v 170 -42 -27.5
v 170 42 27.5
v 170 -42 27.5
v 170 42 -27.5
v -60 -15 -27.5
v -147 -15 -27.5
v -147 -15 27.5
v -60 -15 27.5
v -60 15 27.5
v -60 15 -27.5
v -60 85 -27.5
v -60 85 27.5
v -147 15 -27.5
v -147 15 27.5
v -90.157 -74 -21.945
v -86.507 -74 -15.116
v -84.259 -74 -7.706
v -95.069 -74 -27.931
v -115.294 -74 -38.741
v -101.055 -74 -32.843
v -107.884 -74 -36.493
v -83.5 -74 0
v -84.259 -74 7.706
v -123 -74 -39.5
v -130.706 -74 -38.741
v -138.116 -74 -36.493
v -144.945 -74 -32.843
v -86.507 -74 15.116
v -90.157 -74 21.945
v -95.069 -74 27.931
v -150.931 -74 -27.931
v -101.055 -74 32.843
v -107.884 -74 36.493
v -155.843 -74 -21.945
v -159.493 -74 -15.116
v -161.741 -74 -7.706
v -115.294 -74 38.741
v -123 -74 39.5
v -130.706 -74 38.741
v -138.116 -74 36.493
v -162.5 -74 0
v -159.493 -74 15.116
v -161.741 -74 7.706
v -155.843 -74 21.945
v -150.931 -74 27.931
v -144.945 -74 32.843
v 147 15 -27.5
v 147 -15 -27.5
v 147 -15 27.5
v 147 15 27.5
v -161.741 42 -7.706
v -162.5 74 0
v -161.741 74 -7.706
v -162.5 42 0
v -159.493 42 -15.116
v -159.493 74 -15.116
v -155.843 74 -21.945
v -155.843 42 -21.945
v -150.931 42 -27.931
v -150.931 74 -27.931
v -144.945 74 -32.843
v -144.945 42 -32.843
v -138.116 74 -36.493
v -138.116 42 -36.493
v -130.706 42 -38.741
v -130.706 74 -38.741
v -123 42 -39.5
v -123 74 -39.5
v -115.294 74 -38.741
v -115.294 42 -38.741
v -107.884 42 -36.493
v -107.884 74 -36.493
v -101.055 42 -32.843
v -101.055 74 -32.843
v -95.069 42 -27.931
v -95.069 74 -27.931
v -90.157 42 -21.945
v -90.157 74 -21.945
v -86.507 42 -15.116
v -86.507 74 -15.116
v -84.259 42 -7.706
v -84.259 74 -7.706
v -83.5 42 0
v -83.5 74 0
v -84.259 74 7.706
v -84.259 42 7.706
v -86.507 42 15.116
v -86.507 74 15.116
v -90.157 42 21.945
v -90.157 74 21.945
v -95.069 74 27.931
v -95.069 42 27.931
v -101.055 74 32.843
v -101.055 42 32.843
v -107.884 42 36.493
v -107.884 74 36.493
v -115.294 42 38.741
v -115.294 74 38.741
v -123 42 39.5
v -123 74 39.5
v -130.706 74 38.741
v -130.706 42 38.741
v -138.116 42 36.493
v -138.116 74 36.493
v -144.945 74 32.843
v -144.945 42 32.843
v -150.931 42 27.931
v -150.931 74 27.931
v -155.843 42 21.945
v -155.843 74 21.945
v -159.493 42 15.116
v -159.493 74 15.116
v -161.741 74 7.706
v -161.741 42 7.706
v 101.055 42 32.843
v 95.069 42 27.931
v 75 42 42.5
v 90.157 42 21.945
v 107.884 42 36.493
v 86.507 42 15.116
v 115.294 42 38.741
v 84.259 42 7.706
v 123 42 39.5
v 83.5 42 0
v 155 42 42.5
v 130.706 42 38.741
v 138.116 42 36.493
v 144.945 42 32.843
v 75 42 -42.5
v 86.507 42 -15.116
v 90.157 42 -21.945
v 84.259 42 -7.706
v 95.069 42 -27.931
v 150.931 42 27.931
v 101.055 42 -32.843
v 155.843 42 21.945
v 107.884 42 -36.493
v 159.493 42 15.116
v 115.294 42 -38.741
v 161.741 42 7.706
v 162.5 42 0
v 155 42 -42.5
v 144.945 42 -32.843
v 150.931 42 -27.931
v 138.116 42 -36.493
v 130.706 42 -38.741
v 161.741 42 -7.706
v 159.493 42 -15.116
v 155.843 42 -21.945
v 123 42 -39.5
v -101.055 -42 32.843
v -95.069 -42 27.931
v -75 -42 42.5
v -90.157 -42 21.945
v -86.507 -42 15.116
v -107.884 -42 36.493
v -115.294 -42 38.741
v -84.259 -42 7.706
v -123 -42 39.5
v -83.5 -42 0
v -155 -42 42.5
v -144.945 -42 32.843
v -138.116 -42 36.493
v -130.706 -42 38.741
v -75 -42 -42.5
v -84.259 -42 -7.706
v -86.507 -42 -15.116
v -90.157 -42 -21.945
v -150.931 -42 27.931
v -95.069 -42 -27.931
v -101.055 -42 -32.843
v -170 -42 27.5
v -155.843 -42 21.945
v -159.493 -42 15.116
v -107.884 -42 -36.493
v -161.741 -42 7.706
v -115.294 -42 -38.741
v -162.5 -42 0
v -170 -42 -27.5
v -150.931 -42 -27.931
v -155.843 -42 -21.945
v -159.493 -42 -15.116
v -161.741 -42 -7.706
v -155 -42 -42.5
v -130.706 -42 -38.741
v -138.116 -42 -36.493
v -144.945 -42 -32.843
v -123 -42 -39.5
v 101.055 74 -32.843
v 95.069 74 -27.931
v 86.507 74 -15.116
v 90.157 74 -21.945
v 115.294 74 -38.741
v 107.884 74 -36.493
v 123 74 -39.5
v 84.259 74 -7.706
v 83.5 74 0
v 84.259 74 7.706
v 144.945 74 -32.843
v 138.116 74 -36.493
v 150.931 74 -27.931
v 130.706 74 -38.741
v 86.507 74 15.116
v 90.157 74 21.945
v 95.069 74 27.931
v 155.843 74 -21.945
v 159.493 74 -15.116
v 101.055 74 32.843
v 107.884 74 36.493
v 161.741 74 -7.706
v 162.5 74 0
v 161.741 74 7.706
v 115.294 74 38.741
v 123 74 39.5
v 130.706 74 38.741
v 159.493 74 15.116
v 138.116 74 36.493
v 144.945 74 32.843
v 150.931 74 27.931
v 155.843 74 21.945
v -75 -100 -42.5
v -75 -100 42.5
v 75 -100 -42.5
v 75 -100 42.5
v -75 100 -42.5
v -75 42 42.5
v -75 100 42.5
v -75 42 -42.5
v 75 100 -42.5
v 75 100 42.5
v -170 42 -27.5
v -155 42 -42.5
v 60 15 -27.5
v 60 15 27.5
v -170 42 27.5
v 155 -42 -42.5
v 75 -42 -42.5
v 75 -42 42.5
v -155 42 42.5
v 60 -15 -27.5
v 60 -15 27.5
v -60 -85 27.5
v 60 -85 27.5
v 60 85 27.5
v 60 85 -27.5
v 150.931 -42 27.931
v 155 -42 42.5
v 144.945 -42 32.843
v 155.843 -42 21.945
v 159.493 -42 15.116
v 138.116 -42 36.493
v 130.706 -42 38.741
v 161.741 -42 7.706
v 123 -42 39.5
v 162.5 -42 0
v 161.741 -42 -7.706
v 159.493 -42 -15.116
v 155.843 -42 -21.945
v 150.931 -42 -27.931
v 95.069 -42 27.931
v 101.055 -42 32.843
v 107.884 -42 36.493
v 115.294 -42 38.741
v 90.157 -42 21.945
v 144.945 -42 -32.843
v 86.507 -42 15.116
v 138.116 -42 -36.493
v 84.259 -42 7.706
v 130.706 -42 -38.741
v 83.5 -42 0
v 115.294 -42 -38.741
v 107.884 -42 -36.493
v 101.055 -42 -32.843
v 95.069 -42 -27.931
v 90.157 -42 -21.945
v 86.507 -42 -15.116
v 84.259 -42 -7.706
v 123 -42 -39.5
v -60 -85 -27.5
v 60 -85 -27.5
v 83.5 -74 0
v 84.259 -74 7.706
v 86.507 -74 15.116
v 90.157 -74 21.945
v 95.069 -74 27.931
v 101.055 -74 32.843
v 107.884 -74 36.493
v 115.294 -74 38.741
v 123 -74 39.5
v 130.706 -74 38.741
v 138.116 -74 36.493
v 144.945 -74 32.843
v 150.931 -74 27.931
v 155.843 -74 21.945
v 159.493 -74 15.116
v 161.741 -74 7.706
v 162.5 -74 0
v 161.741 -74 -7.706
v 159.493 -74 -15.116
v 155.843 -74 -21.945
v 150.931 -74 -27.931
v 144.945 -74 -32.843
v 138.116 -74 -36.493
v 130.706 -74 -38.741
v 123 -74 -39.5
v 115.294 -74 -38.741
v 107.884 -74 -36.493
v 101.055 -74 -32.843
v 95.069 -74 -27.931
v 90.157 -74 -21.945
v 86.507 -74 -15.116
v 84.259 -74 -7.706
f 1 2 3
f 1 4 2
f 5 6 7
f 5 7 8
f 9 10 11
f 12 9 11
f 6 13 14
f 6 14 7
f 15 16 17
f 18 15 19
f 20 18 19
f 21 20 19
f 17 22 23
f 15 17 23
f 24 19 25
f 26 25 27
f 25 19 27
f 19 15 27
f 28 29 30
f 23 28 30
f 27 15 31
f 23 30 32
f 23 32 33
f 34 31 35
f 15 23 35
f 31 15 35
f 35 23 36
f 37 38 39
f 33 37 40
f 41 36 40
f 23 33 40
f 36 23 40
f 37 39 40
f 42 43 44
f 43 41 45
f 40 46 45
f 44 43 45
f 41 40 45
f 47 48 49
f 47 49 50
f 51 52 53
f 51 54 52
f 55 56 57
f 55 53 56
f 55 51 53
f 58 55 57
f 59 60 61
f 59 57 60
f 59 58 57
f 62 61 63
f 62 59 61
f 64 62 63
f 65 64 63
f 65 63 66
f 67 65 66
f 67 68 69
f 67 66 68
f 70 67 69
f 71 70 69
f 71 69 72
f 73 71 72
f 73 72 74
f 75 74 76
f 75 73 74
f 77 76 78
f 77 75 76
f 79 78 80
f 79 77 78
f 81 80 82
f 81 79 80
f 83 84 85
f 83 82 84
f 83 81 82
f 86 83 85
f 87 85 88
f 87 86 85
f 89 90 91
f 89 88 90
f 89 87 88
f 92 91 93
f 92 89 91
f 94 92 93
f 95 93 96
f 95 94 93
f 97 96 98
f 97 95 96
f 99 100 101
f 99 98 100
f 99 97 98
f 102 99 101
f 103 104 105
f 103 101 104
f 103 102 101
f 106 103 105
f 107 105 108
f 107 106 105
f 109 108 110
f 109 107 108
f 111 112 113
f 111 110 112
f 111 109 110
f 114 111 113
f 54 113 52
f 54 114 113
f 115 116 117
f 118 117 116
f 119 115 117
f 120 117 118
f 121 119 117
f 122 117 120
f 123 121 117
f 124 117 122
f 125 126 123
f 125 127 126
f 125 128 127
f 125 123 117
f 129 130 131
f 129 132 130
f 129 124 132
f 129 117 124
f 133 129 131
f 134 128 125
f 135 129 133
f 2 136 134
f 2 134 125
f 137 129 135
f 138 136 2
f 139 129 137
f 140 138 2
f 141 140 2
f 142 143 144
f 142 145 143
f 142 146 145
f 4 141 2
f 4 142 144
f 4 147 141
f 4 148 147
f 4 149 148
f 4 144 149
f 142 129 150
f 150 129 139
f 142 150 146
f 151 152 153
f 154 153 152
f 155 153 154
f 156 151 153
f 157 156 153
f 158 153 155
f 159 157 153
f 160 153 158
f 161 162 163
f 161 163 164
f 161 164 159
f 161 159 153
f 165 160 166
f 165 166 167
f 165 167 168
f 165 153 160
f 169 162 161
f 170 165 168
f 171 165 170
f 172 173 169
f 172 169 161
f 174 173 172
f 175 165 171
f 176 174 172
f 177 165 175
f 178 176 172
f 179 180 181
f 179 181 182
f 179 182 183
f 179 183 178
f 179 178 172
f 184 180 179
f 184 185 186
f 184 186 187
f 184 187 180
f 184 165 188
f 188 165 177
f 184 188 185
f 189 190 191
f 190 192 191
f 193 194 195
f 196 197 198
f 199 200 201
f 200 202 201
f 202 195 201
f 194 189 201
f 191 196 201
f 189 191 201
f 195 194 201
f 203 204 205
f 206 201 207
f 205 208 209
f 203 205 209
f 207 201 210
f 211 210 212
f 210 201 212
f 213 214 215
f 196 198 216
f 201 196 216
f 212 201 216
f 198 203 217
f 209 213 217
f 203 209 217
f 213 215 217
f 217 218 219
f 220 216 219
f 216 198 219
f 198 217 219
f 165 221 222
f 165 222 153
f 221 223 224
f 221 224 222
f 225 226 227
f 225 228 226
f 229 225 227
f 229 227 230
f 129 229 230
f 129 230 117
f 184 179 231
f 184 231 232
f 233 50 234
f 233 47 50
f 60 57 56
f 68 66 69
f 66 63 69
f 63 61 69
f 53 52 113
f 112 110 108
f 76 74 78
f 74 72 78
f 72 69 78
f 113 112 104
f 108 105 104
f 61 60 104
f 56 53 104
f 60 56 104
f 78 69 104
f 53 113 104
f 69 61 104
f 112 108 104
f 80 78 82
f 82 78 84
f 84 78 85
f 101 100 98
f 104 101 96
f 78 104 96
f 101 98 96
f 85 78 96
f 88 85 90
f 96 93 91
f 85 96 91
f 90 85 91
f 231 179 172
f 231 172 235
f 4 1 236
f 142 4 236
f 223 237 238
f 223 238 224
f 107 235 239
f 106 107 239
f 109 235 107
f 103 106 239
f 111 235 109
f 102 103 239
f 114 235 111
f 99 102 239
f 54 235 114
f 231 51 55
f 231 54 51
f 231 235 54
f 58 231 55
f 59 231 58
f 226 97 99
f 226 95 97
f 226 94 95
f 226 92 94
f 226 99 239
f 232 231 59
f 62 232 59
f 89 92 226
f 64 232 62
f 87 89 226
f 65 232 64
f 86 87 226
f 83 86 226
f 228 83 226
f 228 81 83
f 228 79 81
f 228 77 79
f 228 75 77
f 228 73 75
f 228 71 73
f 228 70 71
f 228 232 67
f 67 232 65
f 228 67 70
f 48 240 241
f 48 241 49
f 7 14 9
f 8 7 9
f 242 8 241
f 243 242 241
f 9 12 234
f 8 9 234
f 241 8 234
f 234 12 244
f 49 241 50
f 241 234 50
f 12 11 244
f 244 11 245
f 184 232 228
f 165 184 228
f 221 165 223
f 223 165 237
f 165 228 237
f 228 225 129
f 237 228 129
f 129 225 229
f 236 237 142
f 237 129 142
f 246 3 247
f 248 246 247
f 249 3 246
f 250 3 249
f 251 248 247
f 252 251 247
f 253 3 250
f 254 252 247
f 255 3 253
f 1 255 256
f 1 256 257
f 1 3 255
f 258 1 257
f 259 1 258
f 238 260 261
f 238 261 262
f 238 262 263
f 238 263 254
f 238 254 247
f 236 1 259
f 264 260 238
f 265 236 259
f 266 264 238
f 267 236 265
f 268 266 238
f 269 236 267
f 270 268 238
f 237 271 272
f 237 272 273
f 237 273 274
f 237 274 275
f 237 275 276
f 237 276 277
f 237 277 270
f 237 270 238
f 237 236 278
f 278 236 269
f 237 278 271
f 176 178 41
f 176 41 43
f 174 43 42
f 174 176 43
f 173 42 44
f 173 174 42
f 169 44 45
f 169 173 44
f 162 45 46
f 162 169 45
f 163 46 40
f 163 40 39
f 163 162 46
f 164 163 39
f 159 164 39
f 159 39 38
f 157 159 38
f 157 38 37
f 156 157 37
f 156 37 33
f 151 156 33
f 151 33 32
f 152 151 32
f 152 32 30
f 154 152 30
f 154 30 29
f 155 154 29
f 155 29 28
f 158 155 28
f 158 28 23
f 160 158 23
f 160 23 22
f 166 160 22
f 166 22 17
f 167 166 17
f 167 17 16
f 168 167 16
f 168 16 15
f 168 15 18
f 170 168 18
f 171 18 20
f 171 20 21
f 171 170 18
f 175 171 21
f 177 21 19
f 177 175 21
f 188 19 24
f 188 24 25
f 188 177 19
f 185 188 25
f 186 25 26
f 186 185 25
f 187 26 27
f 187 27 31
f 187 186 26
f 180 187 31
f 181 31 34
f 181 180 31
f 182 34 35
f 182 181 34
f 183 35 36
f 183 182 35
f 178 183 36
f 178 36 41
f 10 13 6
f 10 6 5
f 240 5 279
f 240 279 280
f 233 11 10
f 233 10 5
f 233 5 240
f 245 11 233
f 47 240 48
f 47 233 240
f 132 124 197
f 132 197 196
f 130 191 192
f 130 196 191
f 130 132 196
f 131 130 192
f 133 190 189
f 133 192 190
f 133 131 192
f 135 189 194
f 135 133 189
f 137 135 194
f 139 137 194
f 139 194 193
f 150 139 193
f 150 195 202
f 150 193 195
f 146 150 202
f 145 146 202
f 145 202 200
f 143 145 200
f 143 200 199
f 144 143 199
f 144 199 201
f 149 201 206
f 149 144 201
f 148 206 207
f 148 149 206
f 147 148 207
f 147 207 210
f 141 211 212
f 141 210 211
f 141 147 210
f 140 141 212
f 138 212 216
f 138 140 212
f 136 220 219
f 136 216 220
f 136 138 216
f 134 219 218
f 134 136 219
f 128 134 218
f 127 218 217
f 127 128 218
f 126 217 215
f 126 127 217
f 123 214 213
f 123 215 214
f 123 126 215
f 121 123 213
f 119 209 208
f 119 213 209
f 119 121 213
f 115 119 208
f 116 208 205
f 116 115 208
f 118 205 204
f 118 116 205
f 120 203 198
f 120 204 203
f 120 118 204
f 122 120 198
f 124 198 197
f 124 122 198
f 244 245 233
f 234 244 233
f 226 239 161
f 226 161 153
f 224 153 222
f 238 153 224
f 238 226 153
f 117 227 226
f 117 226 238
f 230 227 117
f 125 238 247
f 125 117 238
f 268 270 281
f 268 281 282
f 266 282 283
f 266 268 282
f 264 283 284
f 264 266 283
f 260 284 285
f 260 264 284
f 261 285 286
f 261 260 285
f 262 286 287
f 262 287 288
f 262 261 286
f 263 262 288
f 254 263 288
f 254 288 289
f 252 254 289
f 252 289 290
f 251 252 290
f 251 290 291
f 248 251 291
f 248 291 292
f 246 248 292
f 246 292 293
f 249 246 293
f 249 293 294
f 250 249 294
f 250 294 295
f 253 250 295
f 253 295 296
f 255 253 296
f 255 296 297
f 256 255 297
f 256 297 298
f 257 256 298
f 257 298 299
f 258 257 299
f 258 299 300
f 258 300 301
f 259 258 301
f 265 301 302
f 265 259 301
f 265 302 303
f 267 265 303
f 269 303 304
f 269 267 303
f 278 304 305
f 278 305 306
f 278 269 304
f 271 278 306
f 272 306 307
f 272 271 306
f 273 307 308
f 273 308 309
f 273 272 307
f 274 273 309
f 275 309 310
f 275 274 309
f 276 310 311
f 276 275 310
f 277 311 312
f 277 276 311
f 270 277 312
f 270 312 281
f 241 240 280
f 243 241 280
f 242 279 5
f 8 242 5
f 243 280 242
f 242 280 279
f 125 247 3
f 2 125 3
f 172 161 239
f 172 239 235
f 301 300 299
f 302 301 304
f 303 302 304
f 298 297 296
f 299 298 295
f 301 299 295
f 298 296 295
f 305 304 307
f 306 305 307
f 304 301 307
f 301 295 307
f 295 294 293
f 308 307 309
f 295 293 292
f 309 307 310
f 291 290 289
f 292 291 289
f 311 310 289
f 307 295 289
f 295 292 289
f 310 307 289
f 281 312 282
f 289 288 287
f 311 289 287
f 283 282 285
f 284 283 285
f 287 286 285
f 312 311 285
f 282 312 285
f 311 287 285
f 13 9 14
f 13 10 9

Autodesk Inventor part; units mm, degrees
ref_plane "YZ Plane" through (0, 0, 0) normal (1, 0, 0) x (0, 1, 0)
ref_plane "XZ Plane" through (0, 0, 0) normal (0, 1, 0) x (-1, 0, 0)
ref_plane "XY Plane" through (0, 0, 0) normal (0, 0, 1) x (1, 0, 0)
sketch "Sketch4" plane through (0, 0, 0) normal (0, 0, 1) x (1, 0, 0)
  line L0 (75, -100) -> (-75, -100)
  line L1 (-75, -100) -> (-75, 100)
  line L2 (-75, 100) -> (75, 100)
  line L3 (75, 100) -> (75, -100)
  line L4 (75, -100) -> (-75, 100) construction
  line L5 (-75, -100) -> (75, 100) construction
  line L6 (170, -42) -> (-170, -42)
  line L7 (-170, -42) -> (-170, 42)
  line L8 (-170, 42) -> (170, 42)
  line L9 (170, 42) -> (170, -42)
  line L10 (170, -42) -> (-170, 42) construction
  line L11 (-170, -42) -> (170, 42) construction
  point P0 (0, 0)
  point P1 (0, 0)
  point P2 (0, 0)
  point P3 (75, 42)
  point P4 (-75, 42)
  point P5 (-75, -42)
  point P6 (75, -42)
  dimension "d17" = 84
  dimension "d18" = 340
  dimension "d19" = 150
  dimension "d20" = 200
extrude "Extrusion4" add sketch "Sketch4" along normal mid plane 85
sketch "Sketch5" plane through (0, 0, 0) normal (0, 1, 0) x (-1, 0, 0)
  circle A0 centre (-123, 0) radius 39.5
  circle A1 centre (123, 0) radius 39.5
  line L0 (75, 42.5) -> (-75, 42.5) construction
  line L1 (0, 42.5) -> (0, -42.5) construction
  line L2 (-75, -42.5) -> (75, -42.5) construction
  line L3 (-170, -42.5) -> (-170, 42.5) construction
  line L4 (-170, 0) -> (170, 0) construction
  line L5 (170, -42.5) -> (170, 42.5) construction
  circle A2 centre (-123, 0) radius 31.5
  circle A3 centre (123, 0) radius 31.5
  line L6 (-155, 42.5) -> (-170, 27.5)
  line L7 (-170, -27.5) -> (-155, -42.5)
  line L8 (-170, -42.5) -> (-75, -42.5) projected
  line L9 (170, 42.5) -> (75, 42.5) projected
  line L10 (155, 42.5) -> (170, 27.5)
  line L11 (170, -27.5) -> (155, -42.5)
  line L12 (-75, 42.5) -> (-170, 42.5) projected
  line L13 (75, -42.5) -> (170, -42.5) projected
  line L14 (-170, 42.5) -> (-170, -42.5)
  line L15 (170, 42.5) -> (170, -42.5)
  point P0 (0, 0)
  point P1 (-170, -27.5)
  dimension "d23" = 79
  dimension "d24" = 246
  dimension "d39" = 63
  dimension "d42" = 15
  dimension "d43" = 45
extrude "Extrusion5" add sketch "Sketch5" against normal blind 32 from surface at -42 contours A0 | A1 | A2 | A3
sketch "Sketch6" plane through (0, 0, 0) normal (0, 0, 1) x (1, 0, 0)
  line L0 (147, 15) -> (-147, 15)
  line L1 (-147, 15) -> (-147, -15)
  line L2 (-147, -15) -> (147, -15)
  line L3 (147, -15) -> (147, 15)
  line L4 (147, 15) -> (-147, -15) construction
  line L5 (-147, 15) -> (147, -15) construction
  line L6 (-60, 85) -> (60, 85)
  line L7 (60, 85) -> (60, -85)
  line L8 (60, -85) -> (-60, -85)
  line L9 (-60, -85) -> (-60, 85)
  line L10 (-60, 85) -> (60, -85) construction
  line L11 (60, 85) -> (-60, -85) construction
  line L12 (75, -100) -> (-75, -100) projected
  line L13 (-75, 42) -> (-75, 100) projected
  line L14 (-170, -42) -> (-170, 42) projected
  line L15 (-75, -42) -> (-170, -42) projected
  point P0 (0, 0)
  point P1 (-60, -15)
  point P2 (60, -15)
  point P3 (60, 15)
  point P4 (-60, 15)
  dimension "d27" = 15
  dimension "d28" = 15
  dimension "d29" = 23
  dimension "d30" = 27
  dimension "d46" = 30
extrude "Extrusion6" cut sketch "Sketch6" along normal mid plane 55
extrude "Extrusion8" cut sketch "Sketch5" against normal through all both and the other way through all contours L7 L8 L14 | L6 L14 L12 | L15 L10 L9 | L15 L13 L11
mirror "Mirror1" about plane through (0, 0, 0) normal (0, 1, 0) of "Extrusion5"
equation "\"d21\" = body_thickness"
equation "\"d27\" = wall_thickness"
equation "\"d28\" = wall_thickness"
equation "\"d31\" = body_thickness - 2 * wall_thickness"
equation "\"wall_thickness\" = 15"
equation "\"body_thickness\" = 85"
properties part number "body_inventor"
